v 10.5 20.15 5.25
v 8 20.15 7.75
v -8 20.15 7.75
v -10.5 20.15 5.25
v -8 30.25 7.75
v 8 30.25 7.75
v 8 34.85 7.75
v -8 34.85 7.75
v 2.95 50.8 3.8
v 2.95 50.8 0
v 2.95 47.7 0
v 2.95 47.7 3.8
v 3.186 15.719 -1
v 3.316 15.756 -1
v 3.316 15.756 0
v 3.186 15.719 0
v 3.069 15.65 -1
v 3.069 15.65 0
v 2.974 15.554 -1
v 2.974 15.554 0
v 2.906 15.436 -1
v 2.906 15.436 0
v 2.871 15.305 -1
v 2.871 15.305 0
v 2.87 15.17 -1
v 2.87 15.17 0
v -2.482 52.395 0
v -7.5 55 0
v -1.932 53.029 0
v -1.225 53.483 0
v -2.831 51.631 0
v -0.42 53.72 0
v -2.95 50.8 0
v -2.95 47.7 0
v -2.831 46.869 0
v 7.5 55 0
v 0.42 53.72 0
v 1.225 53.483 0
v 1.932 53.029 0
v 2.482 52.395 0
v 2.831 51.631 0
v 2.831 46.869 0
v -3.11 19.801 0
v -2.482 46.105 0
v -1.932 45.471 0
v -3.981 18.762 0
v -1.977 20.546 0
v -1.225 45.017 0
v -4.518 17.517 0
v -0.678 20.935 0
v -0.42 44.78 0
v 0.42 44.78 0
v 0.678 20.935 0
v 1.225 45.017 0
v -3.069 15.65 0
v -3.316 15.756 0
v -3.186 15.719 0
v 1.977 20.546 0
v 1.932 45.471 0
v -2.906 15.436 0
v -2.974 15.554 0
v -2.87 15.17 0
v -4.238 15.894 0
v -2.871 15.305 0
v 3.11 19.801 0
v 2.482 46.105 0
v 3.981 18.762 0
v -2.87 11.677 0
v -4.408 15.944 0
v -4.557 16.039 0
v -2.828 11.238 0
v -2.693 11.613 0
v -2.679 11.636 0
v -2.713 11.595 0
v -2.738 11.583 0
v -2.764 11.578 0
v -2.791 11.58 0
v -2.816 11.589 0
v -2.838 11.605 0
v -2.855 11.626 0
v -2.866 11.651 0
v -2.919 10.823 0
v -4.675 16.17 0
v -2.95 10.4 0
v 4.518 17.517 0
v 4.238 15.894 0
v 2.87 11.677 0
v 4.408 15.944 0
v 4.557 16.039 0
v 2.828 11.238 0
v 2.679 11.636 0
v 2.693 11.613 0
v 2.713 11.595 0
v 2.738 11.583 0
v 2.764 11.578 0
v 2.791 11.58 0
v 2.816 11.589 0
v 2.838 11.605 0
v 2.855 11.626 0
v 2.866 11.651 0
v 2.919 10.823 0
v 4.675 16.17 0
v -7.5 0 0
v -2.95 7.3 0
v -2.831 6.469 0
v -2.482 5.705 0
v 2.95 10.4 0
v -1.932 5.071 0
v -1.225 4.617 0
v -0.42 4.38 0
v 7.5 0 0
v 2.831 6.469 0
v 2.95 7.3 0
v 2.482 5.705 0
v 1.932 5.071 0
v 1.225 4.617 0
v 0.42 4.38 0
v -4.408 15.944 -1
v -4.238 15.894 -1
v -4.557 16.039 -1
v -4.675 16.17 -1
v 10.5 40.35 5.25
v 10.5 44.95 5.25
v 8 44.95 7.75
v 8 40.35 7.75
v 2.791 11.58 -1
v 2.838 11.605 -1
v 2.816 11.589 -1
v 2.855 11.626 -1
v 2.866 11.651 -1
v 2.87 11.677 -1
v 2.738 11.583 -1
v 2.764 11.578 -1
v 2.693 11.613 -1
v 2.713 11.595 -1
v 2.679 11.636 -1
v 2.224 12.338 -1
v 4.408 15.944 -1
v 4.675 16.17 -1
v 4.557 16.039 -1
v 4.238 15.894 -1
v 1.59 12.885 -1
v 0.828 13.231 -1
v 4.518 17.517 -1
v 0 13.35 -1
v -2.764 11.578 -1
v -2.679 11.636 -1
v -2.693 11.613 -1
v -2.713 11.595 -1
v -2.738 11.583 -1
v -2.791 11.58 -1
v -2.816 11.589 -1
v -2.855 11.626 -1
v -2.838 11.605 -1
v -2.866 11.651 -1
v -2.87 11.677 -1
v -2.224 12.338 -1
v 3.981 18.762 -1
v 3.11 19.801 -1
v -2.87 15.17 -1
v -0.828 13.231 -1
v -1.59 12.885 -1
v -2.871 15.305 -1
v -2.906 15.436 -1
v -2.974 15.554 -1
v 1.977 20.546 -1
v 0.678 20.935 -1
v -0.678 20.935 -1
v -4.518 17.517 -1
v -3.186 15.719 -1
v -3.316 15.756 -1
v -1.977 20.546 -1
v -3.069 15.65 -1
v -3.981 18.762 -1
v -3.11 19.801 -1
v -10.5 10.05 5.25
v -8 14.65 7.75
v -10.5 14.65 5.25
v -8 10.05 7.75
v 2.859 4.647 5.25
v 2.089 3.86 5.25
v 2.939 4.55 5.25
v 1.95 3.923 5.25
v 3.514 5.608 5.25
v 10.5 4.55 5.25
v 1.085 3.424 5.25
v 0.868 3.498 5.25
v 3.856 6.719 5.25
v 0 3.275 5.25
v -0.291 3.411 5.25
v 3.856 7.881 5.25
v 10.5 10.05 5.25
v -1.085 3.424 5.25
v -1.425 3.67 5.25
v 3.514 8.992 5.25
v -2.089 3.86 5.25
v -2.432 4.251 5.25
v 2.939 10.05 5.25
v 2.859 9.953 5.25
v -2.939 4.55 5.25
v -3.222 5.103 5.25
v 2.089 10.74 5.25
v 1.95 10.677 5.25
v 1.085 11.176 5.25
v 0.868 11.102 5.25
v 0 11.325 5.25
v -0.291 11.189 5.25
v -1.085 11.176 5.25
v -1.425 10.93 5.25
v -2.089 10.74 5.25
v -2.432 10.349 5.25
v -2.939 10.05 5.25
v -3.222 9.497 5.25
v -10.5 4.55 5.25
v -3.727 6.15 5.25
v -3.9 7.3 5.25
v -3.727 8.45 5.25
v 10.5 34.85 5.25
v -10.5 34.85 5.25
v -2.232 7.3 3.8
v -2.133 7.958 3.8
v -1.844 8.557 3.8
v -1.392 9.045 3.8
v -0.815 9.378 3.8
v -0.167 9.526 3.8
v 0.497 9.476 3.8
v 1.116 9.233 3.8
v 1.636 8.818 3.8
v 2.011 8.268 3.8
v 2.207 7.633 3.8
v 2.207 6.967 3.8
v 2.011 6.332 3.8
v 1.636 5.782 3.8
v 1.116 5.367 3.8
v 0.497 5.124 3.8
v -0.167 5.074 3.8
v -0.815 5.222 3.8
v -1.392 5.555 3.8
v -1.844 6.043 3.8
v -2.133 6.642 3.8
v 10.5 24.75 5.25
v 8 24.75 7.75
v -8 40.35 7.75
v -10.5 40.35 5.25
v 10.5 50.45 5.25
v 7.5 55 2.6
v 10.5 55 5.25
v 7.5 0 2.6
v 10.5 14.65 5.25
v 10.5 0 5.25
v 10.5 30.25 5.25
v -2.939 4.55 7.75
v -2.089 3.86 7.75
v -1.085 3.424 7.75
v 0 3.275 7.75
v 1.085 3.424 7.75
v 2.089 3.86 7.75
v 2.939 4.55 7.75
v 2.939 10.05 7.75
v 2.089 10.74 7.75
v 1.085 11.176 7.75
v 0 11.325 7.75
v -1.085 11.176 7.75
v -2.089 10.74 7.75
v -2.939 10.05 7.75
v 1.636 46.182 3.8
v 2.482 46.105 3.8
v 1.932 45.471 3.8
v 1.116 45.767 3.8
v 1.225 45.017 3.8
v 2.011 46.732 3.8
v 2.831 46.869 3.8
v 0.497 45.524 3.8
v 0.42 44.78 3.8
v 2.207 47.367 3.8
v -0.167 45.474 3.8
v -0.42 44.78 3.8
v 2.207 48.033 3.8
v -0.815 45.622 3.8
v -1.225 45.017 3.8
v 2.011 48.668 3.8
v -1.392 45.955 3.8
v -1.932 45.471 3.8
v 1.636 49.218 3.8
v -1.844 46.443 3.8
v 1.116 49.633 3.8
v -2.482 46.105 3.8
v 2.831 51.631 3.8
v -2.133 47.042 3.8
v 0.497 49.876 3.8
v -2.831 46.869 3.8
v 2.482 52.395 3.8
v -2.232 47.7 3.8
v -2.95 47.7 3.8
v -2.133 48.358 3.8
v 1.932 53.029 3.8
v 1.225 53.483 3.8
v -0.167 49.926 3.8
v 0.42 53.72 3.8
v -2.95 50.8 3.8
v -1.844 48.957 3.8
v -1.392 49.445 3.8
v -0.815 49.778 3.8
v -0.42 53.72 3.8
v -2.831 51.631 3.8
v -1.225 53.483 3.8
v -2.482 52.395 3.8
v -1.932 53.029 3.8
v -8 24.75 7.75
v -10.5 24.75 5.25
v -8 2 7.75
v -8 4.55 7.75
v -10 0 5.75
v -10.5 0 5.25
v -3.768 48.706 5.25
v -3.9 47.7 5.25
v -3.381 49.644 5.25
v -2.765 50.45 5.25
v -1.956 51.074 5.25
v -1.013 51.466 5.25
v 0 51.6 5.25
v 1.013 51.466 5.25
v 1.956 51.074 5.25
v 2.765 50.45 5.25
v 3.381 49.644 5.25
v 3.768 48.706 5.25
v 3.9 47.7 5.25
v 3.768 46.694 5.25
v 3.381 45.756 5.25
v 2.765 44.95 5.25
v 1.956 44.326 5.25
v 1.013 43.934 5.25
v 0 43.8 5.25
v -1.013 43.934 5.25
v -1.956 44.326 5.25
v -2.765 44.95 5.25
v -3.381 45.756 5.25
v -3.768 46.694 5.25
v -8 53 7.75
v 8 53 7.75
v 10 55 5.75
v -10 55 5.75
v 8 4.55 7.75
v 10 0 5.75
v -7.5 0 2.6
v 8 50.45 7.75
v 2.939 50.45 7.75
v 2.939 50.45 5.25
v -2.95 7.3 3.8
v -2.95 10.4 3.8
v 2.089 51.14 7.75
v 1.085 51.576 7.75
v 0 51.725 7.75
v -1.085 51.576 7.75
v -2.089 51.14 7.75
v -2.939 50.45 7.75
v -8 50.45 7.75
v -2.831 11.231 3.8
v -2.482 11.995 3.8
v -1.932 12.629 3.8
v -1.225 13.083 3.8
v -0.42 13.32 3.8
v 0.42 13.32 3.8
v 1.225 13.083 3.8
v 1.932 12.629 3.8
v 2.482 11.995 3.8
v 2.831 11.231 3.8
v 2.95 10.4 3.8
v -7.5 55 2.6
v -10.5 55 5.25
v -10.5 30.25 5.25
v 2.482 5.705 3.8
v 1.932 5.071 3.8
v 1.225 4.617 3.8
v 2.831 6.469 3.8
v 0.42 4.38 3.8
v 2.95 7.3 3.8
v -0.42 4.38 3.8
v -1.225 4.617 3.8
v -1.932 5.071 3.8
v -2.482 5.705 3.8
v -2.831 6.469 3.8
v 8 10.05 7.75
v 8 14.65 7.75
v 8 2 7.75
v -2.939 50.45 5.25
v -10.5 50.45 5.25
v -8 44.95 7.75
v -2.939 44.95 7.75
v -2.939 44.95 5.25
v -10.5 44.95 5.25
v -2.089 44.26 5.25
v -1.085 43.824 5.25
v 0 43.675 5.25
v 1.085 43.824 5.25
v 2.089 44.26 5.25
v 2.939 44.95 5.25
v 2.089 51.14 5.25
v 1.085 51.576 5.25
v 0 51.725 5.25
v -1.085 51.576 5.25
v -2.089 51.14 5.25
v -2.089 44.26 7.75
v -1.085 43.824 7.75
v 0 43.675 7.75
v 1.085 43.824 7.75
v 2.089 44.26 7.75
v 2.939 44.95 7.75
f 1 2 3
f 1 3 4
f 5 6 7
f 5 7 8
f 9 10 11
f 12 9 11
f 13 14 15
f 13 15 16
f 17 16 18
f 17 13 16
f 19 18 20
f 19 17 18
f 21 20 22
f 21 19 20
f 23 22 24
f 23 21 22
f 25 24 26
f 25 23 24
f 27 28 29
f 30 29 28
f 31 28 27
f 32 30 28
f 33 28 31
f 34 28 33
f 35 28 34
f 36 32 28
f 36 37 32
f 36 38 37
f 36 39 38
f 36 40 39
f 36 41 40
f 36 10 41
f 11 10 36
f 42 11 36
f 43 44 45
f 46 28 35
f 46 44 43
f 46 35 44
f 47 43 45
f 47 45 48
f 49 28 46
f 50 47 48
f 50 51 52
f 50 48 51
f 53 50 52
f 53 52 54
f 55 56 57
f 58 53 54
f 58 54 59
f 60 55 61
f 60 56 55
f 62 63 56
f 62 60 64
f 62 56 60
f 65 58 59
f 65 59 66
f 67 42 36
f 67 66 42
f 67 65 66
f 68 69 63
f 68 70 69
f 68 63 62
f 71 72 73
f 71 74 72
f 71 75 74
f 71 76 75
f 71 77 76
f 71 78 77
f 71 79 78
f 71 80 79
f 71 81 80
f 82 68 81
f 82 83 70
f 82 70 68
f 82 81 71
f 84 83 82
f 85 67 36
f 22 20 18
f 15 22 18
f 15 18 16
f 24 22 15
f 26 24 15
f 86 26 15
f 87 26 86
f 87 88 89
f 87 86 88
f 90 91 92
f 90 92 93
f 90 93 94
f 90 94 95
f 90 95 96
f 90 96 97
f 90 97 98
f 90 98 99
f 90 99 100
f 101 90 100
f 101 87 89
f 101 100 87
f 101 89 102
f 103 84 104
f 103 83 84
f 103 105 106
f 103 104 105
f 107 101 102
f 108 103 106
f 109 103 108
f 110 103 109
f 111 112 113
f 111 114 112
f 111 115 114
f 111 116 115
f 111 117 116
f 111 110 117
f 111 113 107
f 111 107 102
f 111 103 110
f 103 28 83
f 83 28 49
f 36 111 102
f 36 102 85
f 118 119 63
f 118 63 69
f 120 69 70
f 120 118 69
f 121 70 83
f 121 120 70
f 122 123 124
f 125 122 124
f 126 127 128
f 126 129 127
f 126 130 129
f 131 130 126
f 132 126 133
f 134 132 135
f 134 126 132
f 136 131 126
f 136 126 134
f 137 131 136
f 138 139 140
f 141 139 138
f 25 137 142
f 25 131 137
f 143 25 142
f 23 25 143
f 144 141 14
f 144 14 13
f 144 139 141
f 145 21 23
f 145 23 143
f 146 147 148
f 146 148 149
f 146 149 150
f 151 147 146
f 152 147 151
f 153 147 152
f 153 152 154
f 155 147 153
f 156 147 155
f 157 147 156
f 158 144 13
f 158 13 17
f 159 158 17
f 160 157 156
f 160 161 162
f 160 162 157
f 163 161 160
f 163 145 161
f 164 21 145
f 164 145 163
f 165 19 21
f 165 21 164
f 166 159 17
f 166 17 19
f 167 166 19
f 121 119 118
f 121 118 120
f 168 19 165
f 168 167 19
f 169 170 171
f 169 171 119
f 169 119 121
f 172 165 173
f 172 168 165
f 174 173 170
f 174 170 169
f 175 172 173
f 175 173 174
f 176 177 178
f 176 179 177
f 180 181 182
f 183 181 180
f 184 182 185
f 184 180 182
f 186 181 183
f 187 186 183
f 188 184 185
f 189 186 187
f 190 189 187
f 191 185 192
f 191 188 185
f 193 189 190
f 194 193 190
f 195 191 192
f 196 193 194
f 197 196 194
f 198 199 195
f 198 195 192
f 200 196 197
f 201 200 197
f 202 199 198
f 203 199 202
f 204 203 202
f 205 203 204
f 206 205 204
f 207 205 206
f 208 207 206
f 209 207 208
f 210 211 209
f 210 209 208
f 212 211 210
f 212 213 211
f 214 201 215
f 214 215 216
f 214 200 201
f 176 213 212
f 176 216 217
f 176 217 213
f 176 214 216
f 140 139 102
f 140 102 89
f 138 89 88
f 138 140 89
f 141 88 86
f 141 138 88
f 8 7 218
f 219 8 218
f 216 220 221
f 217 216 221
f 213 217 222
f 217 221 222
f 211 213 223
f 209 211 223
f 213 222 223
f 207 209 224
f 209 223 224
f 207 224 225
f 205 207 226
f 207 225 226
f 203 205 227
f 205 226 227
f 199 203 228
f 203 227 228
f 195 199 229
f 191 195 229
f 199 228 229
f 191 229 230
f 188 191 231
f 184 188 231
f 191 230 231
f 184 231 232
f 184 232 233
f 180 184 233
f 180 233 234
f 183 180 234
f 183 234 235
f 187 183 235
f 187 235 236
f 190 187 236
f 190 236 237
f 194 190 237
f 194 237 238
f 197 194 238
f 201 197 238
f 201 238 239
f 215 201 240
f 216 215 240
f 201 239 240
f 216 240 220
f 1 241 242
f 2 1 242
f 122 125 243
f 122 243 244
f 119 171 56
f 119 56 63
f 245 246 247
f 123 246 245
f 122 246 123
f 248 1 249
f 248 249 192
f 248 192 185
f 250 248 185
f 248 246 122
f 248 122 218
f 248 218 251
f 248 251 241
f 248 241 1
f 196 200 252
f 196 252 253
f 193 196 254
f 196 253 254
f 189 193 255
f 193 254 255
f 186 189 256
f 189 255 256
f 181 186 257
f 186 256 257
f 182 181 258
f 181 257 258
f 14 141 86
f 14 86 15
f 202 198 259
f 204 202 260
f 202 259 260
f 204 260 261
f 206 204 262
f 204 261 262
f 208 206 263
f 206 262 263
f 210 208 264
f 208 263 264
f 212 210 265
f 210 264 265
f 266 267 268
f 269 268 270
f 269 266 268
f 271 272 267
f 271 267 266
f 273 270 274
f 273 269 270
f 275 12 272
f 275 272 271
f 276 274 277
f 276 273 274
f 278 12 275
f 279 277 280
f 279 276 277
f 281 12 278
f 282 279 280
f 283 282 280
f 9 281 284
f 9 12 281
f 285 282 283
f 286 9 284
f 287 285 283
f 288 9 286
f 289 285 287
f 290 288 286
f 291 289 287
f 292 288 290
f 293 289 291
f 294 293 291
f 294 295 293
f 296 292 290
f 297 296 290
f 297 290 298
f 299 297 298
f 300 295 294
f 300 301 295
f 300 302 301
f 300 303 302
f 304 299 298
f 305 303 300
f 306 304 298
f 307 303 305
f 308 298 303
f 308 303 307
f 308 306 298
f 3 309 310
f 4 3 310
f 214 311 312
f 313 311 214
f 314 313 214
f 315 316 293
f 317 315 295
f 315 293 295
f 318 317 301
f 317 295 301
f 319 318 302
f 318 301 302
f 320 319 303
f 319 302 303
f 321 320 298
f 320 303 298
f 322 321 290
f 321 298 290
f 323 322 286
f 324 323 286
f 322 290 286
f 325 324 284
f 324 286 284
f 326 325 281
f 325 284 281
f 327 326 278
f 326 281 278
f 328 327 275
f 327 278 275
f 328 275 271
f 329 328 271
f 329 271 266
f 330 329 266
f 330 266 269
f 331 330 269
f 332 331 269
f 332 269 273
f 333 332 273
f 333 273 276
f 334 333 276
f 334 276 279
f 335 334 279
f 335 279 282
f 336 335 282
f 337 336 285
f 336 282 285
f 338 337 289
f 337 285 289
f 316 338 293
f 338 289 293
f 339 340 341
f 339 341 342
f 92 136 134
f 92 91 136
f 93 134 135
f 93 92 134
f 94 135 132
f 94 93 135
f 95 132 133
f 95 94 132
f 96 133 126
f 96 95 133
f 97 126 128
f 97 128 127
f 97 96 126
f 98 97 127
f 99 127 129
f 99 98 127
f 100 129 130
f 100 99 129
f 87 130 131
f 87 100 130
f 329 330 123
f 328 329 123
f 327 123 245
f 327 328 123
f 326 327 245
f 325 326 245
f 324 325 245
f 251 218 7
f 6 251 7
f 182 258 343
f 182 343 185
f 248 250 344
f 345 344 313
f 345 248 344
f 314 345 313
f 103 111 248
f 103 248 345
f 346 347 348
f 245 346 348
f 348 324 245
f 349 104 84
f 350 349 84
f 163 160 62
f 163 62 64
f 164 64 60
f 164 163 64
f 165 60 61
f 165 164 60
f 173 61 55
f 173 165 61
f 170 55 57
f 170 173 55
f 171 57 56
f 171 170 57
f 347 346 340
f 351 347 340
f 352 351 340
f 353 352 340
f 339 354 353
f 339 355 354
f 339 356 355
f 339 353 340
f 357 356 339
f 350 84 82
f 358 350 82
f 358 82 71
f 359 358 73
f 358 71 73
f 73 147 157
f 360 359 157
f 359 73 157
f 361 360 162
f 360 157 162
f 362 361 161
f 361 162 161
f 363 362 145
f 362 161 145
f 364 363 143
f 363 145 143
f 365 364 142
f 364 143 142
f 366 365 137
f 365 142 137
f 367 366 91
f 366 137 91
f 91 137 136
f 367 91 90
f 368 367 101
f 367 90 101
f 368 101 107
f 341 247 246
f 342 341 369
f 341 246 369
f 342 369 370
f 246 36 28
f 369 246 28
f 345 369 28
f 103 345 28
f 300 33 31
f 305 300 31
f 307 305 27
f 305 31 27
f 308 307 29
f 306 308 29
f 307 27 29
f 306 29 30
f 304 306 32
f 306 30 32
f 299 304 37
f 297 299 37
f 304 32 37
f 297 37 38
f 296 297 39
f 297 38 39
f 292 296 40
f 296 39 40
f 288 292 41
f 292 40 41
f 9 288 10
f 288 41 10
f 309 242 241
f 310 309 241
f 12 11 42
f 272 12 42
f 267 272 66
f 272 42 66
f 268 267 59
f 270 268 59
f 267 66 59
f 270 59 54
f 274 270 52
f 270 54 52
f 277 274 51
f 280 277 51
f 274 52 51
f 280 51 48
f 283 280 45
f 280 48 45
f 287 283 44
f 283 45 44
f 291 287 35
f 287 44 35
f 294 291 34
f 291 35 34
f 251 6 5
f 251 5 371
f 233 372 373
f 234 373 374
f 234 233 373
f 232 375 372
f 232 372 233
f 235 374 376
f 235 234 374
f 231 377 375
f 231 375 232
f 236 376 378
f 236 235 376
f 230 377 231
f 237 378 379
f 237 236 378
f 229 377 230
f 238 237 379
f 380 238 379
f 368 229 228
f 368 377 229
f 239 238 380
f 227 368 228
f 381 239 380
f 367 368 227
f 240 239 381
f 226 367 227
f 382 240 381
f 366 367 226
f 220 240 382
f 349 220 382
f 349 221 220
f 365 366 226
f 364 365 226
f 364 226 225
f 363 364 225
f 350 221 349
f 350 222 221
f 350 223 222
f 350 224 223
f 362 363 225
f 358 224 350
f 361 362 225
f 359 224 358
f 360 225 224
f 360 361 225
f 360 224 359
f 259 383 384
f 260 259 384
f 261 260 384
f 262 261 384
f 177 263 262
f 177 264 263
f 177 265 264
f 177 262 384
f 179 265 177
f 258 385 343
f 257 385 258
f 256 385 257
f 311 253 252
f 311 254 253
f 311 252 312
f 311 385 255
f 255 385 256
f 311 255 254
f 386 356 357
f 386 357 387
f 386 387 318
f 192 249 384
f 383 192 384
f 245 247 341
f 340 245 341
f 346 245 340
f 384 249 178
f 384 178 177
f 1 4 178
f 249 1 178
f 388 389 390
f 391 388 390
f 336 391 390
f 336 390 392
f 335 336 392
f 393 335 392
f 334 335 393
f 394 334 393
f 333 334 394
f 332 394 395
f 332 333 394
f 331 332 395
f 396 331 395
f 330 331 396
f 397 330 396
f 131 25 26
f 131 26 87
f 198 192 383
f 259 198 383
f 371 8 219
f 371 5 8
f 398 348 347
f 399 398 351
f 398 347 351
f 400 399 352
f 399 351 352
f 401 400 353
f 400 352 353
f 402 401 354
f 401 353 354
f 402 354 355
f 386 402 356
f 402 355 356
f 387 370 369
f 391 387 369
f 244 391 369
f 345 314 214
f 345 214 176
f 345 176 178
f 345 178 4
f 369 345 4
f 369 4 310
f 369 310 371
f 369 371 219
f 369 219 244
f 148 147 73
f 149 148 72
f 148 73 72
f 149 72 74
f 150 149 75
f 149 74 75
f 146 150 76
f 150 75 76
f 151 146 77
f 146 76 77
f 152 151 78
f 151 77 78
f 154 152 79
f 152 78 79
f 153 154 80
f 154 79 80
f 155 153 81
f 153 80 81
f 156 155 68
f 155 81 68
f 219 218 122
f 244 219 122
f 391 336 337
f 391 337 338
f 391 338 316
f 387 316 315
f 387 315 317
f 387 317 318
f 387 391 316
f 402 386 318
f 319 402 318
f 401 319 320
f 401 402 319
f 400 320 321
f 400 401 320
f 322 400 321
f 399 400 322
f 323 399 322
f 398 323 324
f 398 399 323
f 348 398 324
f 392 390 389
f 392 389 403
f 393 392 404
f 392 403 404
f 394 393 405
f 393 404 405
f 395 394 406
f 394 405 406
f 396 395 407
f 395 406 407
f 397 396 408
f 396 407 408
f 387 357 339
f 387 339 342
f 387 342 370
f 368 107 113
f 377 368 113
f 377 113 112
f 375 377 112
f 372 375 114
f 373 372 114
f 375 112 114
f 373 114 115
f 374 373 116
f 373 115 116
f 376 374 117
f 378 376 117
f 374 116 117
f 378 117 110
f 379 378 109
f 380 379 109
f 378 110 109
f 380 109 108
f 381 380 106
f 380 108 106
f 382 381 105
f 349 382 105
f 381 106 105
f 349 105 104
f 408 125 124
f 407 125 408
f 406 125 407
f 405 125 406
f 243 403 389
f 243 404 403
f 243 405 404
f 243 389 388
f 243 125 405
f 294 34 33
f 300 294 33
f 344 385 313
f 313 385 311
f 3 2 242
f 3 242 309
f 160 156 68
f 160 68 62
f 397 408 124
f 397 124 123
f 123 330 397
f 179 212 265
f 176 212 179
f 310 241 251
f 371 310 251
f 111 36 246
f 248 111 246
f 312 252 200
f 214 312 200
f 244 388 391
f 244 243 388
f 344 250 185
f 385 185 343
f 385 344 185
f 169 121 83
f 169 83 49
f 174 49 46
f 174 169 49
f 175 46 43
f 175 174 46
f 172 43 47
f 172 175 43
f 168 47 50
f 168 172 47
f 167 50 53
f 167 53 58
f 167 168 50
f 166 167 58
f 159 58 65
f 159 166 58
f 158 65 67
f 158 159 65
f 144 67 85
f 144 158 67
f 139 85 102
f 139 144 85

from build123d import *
from OCP.BRepAlgoAPI import BRepAlgoAPI_Cut
from OCP.TopTools import TopTools_ListOfShape

# Parameters (mm, degrees)
EXTRUDE_1_DEPTH          = 55
CUT_EXTRUDE_1_DEPTH      = 57.52709527297507
CUT_EXTRUDE_1_DEPTH_BACK = 57.52709527297507
SKETCH_2_W               = 2.5000000000000018
SKETCH_2_H               = 5.5000000000000036
SKETCH_2_H_2             = 5.499999999999993
SKETCH_2_H_3             = 5.5
CHAMFER_1_SIZE           = 2
SKETCH_3_R               = 1.8999999999999997
SKETCH_3_R_2             = 1.9000000000000001
CUT_EXTRUDE_2_DEPTH      = 57.52709527297507
SKETCH_4_R               = 4.025
CUT_EXTRUDE_3_DEPTH      = 2.5
CUT_EXTRUDE_4_DEPTH      = 3.8
EXTRUDE_START            = -1
EXTRUDE_2_DEPTH          = 1
FILLET_1_R               = 0.1


with BuildPart() as part:
    # 스케치1 → 보스-돌출1 (new body)
    with BuildSketch(Plane(origin=(0, 0, 0), x_dir=(1, 0, 0), z_dir=(0, 1, 0))):
        Polygon((-7.5, 0), (7.5, 0), (7.5, -2.5999999999999983), (10.5, -5.249999999999997), (8.000000000000002, -7.749999999999999), (-7.999999999999998, -7.750000000000001), (-10.5, -5.25), (-7.5, -2.6), align=None)
    extrude(amount=EXTRUDE_1_DEPTH)


with BuildPart() as cut_extrude_1_tool:
    # 스케치2 → 컷-돌출1 (new, two sides: drawn at the far end of the back side and taken through both)
    with BuildSketch(Plane(origin=(0, 0, 0), x_dir=(0, 0, -1), z_dir=(1, 0, 0)).offset(-CUT_EXTRUDE_1_DEPTH_BACK)):
        Polygon((-7.749999999999999, 4.549999999999999), (-5.249999999999997, 4.549999999999999), (-5.249999999999997, 10.049999999999997), (-7.749999999999999, 10.049999999999999), align=None)
        Polygon((-7.749999834765438, 20.150000000000002), (-5.249999834765436, 20.150000000000002), (-5.249999834765436, 14.649999999999999), (-7.749999834765438, 14.65), align=None)
        with Locations((-6.499999669530876, 27.5)):
            Rectangle(SKETCH_2_W, SKETCH_2_H)
        with Locations((-6.499999504296315, 37.599999999999994)):
            Rectangle(SKETCH_2_W, SKETCH_2_H_2)
        with Locations((-6.499999339061754, 47.699999999999996)):
            Rectangle(SKETCH_2_W, SKETCH_2_H_3)
    extrude(amount=CUT_EXTRUDE_1_DEPTH + CUT_EXTRUDE_1_DEPTH_BACK)


with BuildPart() as part_1:
    add(part.part)

    # 컷-돌출1: cut by cut_extrude_1_tool, with a tolerance
    cut_extrude_1_stock = TopTools_ListOfShape()
    cut_extrude_1_stock.Append(part_1.part.wrapped)
    cut_extrude_1_tools = TopTools_ListOfShape()
    cut_extrude_1_tools.Append(cut_extrude_1_tool.part.wrapped)
    cut_extrude_1_cut = BRepAlgoAPI_Cut()
    cut_extrude_1_cut.SetArguments(cut_extrude_1_stock)
    cut_extrude_1_cut.SetTools(cut_extrude_1_tools)
    cut_extrude_1_cut.SetFuzzyValue(0.00001)
    cut_extrude_1_cut.Build()
    add(Compound.cast(cut_extrude_1_cut.Shape()).solids(), mode=Mode.REPLACE)

    # 모따기1
    chamfer_1_edges = [part_1.edges().sort_by_distance(p)[0] for p in [
        (1.78e-15, 55, 7.75),
        (1.78e-15, 0, 7.75),
    ]]
    chamfer(chamfer_1_edges, length=CHAMFER_1_SIZE)

    # 스케치3 → 컷-돌출2 (cut, through all)
    with BuildSketch(Plane.XY):
        with Locations(Location((-3.47e-15, 47.699999999999996, 0), (0, 0, 180))):
            Circle(SKETCH_3_R)
        with Locations(Location((-3.47e-15, 7.299999999999997, 0), (0, 0, 180))):
            Circle(SKETCH_3_R_2)
    extrude(amount=CUT_EXTRUDE_2_DEPTH, mode=Mode.SUBTRACT)

    # 스케치4 → 컷-돌출3 (cut)
    with BuildSketch(Plane.XY.offset(7.75)):
        with Locations((-4.31e-15, 7.299999999999997)):
            Circle(SKETCH_4_R)
        with Locations((-4.31e-15, 47.699999999999996)):
            Circle(SKETCH_4_R)
    extrude(amount=-CUT_EXTRUDE_3_DEPTH, mode=Mode.SUBTRACT)

    # 모따기2
    # the kernel refuses this chamfer: 2, 1.738573476 mm, written as the material it takes off along each edge
    with BuildSketch(Plane(origin=(-3.47e-15, 47.699999999999996, 5.249999339061753), x_dir=(-1, 0, 0), z_dir=(0, -1, 0))) as chamfer_2_piece_1_section:
        with BuildLine():
            Line((3.9603767664178213, -0.05248472231924062), (1.839623233582178, 1.7910581979517))
            Line((1.839623233582178, 1.7910581979517), (1.799623233582178, 1.7910581979517))
            ThreePointArc((1.799623233582178, 1.7910581979517), (1.8599999999999997, 0.8955290989758504), (1.8599999999999997, 0))
            Line((1.8599999999999997, 0), (1.8999999999999997, -0.04000000000000004))
            ThreePointArc((1.8999999999999997, -0.04000000000000004), (2.9301883832089106, -0.04000000000000004), (3.9603767664178213, -0.09248472231924065))
            Line((3.9603767664178213, -0.09248472231924065), (3.9603767664178213, -0.05248472231924062))
        make_face()
    chamfer_2_piece_1 = revolve(axis=Axis((-3.47e-15, 47.699999999999996, 5.249999339061753), (0, 0, -1)), mode=Mode.PRIVATE)
    chamfer_2_piece_1 = split(chamfer_2_piece_1, bisect_by=Plane(origin=(-3.47e-15, 50.449999999999996, 5.249999339061753), z_dir=(0, -1, 0)), keep=Keep.TOP, mode=Mode.PRIVATE)
    chamfer_2_piece_1 = split(chamfer_2_piece_1, bisect_by=Plane(origin=(-3.47e-15, 44.949999999999996, 5.249999339061753), z_dir=(0, 1, 0)), keep=Keep.TOP, mode=Mode.PRIVATE)
    add(chamfer_2_piece_1, mode=Mode.SUBTRACT)
    with BuildSketch(Plane(origin=(-3.47e-15, 47.699999999999996, 5.249999339061753), x_dir=(-1, 0, 0), z_dir=(0, -1, 0))) as chamfer_2_piece_2_section:
        with BuildLine():
            Line((3.9603767664178213, -0.05248472231924062), (1.839623233582178, 1.7910581979517))
            Line((1.839623233582178, 1.7910581979517), (1.799623233582178, 1.7910581979517))
            ThreePointArc((1.799623233582178, 1.7910581979517), (1.8599999999999997, 0.8955290989758504), (1.8599999999999997, 0))
            Line((1.8599999999999997, 0), (1.8999999999999997, -0.04000000000000004))
            ThreePointArc((1.8999999999999997, -0.04000000000000004), (2.9301883832089106, -0.04000000000000004), (3.9603767664178213, -0.09248472231924065))
            Line((3.9603767664178213, -0.09248472231924065), (3.9603767664178213, -0.05248472231924062))
        make_face()
    chamfer_2_piece_2 = revolve(axis=Axis((-3.47e-15, 47.699999999999996, 5.249999339061753), (0, 0, -1)), mode=Mode.PRIVATE)
    chamfer_2_piece_2 = split(chamfer_2_piece_2, bisect_by=Plane(origin=(-3.47e-15, 44.949999999999996, 5.249999339061753), z_dir=(0, -1, 0)), keep=Keep.TOP, mode=Mode.PRIVATE)
    add(chamfer_2_piece_2, mode=Mode.SUBTRACT)
    with BuildSketch(Plane(origin=(-3.47e-15, 47.699999999999996, 5.249999339061753), x_dir=(-1, 0, 0), z_dir=(0, -1, 0))) as chamfer_2_piece_3_section:
        with BuildLine():
            Line((3.9603767664178213, -0.05248472231924062), (1.839623233582178, 1.7910581979517))
            Line((1.839623233582178, 1.7910581979517), (1.799623233582178, 1.7910581979517))
            ThreePointArc((1.799623233582178, 1.7910581979517), (1.8599999999999997, 0.8955290989758504), (1.8599999999999997, 0))
            Line((1.8599999999999997, 0), (1.8999999999999997, -0.04000000000000004))
            ThreePointArc((1.8999999999999997, -0.04000000000000004), (2.9301883832089106, -0.04000000000000004), (3.9603767664178213, -0.09248472231924065))
            Line((3.9603767664178213, -0.09248472231924065), (3.9603767664178213, -0.05248472231924062))
        make_face()
    chamfer_2_piece_3 = revolve(axis=Axis((-3.47e-15, 47.699999999999996, 5.249999339061753), (0, 0, -1)), mode=Mode.PRIVATE)
    chamfer_2_piece_3 = split(chamfer_2_piece_3, bisect_by=Plane(origin=(-3.47e-15, 50.449999999999996, 5.249999339061753), z_dir=(0, 1, 0)), keep=Keep.TOP, mode=Mode.PRIVATE)
    add(chamfer_2_piece_3, mode=Mode.SUBTRACT)
    with BuildSketch(Plane(origin=(-3.47e-15, 7.299999999999997, 5.249999999999997), x_dir=(-1, 0, 0), z_dir=(0, -1, 0))) as chamfer_2_piece_4:
        with BuildLine():
            Line((3.960376766417822, -0.05248472231924062), (1.8396232335821785, 1.7910581979517))
            Line((1.8396232335821785, 1.7910581979517), (1.7996232335821785, 1.7910581979517))
            ThreePointArc((1.7996232335821785, 1.7910581979517), (1.86, 0.8955290989758504), (1.86, 0))
            Line((1.86, 0), (1.9000000000000001, -0.04000000000000004))
            ThreePointArc((1.9000000000000001, -0.04000000000000004), (2.930188383208911, -0.04000000000000004), (3.960376766417822, -0.09248472231924065))
            Line((3.960376766417822, -0.09248472231924065), (3.960376766417822, -0.05248472231924062))
        make_face()
    revolve(axis=Axis((-3.47e-15, 7.299999999999997, 5.249999999999997), (0, 0, -1)), mode=Mode.SUBTRACT)

    # 스케치5 → 컷-돌출4 (cut)
    with BuildSketch(Plane.XY):
        with BuildLine():
            Line((2.95, 50.79999999999999), (2.9500000000000006, 47.699999999999996))
            ThreePointArc((2.9500000000000006, 47.699999999999996), (-4.01e-15, 44.75), (-2.9499999999999997, 47.699999999999996))
            Line((-2.9499999999999997, 47.699999999999996), (-2.95, 50.79999999999999))
            ThreePointArc((-2.95, 50.79999999999999), (1.7e-16, 53.74999999999999), (2.95, 50.79999999999999))
        make_face()
        with BuildLine():
            Line((-2.95, 7.299999999999997), (-2.95, 10.400000000000002))
            ThreePointArc((-2.95, 10.400000000000002), (1.8e-16, 13.350000000000001), (2.95, 10.400000000000002))
            Line((2.95, 10.400000000000002), (2.95, 7.299999999999997))
            ThreePointArc((2.95, 7.299999999999997), (-4.01e-15, 4.3500000000000005), (-2.95, 7.299999999999997))
        make_face()
    extrude(amount=CUT_EXTRUDE_4_DEPTH, mode=Mode.SUBTRACT)

    # 스케치6 → 보스-돌출2 (add)
    with BuildSketch(Plane.XY.offset(EXTRUDE_START)):
        with BuildLine():
            Line((-2.8696028673118352, 11.084017093292044), (-2.8696028673118352, 15.17002285126479))
            ThreePointArc((-2.8696028673118352, 15.17002285126479), (-2.97394354223574, 15.553533335617065), (-3.3160113650873604, 15.75591137943913))
            Line((-3.3160113650873604, 15.75591137943913), (-4.238447681040065, 15.894178508998346))
            ThreePointArc((-4.238447681040065, 15.894178508998346), (-4.485741808137749, 15.986176732767143), (-4.675, 16.17002285126479))
            ThreePointArc((-4.675, 16.17002285126479), (-3.3552259820417296, 19.565361197223766), (0, 20.984017093292046))
            ThreePointArc((0, 20.984017093292046), (3.355225982041729, 19.565361197223766), (4.675, 16.17002285126479))
            ThreePointArc((4.675, 16.17002285126479), (4.485741808137749, 15.986176732767143), (4.238447681040065, 15.894178508998346))
            Line((4.238447681040065, 15.894178508998346), (3.3160113650873604, 15.75591137943913))
            ThreePointArc((3.3160113650873604, 15.75591137943913), (2.9739435422357396, 15.553533335617065), (2.8696028673118352, 15.17002285126479))
            Line((2.8696028673118352, 15.17002285126479), (2.8696028673118352, 11.084017093292044))
            ThreePointArc((2.8696028673118352, 11.084017093292044), (1.8e-16, 13.350000000000001), (-2.8696028673118352, 11.084017093292044))
        make_face()
    extrude(amount=EXTRUDE_2_DEPTH)

    # 필렛1
    fillet_1_edges = [part_1.edges().sort_by_distance(p)[0] for p in [
        (-2.8696028673118352, 11.084017093292044, -0.5),
        (2.8696028673118352, 11.084017093292044, -0.5),
    ]]
    fillet(fillet_1_edges, radius=FILLET_1_R)


solid = part_1.part
